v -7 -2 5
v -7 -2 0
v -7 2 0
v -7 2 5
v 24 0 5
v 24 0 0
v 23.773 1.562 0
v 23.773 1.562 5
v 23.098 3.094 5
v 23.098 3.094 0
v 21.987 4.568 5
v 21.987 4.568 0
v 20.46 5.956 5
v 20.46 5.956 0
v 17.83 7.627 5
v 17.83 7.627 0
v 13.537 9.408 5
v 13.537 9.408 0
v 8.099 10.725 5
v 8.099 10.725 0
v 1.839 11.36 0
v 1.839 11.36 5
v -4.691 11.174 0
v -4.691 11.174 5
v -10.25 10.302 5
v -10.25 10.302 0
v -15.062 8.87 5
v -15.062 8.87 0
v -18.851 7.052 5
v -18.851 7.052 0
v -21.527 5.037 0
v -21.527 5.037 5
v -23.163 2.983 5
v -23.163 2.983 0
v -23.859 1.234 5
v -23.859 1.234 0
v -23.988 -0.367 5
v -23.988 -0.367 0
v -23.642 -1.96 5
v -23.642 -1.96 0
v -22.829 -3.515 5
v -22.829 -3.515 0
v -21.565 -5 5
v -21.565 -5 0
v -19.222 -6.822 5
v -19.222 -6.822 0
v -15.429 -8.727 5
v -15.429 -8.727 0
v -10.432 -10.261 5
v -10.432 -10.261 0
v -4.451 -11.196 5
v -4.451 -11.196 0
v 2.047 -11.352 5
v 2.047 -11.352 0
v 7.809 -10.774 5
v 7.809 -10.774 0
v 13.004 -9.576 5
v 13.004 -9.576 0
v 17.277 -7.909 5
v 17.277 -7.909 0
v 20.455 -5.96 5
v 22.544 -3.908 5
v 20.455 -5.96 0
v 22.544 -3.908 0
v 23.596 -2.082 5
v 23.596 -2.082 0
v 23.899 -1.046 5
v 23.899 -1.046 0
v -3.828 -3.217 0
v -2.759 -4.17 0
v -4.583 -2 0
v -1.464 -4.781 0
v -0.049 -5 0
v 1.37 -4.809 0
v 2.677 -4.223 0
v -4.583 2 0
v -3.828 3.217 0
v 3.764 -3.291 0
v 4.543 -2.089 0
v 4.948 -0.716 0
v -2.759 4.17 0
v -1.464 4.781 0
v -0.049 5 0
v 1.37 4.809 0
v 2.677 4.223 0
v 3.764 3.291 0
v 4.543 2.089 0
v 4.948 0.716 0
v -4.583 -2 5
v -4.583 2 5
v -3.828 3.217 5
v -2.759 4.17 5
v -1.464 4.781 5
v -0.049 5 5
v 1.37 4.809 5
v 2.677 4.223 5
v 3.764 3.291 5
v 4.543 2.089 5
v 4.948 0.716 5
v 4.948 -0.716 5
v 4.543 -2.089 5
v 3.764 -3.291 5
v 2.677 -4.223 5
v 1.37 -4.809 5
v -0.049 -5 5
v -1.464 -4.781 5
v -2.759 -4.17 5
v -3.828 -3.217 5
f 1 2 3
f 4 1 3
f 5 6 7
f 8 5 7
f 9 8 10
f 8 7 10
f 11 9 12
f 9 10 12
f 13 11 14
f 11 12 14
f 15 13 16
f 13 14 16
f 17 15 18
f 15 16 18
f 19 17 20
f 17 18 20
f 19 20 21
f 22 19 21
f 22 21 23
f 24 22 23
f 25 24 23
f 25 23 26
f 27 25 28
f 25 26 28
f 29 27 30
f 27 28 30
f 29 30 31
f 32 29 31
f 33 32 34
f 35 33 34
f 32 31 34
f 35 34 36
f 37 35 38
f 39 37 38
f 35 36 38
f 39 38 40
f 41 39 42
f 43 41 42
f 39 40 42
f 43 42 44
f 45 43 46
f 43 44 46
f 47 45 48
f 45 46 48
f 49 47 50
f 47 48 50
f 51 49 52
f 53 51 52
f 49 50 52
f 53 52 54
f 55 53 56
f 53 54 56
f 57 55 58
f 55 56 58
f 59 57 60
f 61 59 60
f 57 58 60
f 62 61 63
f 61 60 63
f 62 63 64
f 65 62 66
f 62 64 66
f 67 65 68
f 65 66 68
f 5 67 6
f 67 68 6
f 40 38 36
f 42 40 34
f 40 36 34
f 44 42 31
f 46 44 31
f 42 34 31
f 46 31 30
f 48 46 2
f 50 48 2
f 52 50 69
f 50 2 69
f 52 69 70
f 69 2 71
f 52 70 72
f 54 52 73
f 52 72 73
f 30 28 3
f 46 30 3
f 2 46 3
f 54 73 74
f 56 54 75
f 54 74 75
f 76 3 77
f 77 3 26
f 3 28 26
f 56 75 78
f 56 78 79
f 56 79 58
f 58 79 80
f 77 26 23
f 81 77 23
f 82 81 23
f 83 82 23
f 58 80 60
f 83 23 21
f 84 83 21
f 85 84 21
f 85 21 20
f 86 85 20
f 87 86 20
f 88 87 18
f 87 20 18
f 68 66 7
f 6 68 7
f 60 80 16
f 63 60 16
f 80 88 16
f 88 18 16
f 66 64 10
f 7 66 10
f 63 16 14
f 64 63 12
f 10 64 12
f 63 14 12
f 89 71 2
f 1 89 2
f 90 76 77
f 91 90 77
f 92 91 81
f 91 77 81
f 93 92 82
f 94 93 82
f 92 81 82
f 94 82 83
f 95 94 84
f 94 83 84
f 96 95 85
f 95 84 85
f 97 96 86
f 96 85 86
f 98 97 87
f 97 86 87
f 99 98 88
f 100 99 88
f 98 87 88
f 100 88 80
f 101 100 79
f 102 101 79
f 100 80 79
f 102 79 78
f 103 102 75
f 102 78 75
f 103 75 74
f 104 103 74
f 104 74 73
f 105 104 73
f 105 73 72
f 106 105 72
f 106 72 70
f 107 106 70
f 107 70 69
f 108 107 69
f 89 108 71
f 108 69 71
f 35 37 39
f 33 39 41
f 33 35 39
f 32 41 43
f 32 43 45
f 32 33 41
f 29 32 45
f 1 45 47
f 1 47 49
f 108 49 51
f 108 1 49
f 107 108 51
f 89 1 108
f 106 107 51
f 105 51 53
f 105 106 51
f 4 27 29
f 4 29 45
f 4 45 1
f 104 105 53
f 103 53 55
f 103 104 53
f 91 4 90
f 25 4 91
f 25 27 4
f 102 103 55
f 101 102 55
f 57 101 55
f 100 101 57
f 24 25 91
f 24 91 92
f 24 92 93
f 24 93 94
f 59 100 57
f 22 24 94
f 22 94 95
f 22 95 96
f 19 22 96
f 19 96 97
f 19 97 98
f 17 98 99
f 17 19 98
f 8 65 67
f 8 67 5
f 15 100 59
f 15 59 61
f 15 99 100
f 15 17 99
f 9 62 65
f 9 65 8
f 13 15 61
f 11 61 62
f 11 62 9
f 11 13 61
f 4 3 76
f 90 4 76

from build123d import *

# Parameters (mm, degrees)
CROQUIS1_RX             = 24
CROQUIS1_RY             = 11.39361319
SALIENTE_EXTRUIR1_DEPTH = 5


with BuildPart() as part:
    # Croquis1 → Saliente-Extruir1 (new body)
    with BuildSketch(Plane.XY):
        with Locations((0, 0)):
            Ellipse(CROQUIS1_RX, CROQUIS1_RY)
        with BuildLine():
            Line((-7, 2), (-4.582575695, 2))
            ThreePointArc((-4.582575695, 2), (5, 0), (-4.582575695, -2))
            Line((-4.582575695, -2), (-7, -2))
            Line((-7, -2), (-7, 2))
        make_face(mode=Mode.SUBTRACT)
    extrude(amount=SALIENTE_EXTRUIR1_DEPTH)


solid = part.part
